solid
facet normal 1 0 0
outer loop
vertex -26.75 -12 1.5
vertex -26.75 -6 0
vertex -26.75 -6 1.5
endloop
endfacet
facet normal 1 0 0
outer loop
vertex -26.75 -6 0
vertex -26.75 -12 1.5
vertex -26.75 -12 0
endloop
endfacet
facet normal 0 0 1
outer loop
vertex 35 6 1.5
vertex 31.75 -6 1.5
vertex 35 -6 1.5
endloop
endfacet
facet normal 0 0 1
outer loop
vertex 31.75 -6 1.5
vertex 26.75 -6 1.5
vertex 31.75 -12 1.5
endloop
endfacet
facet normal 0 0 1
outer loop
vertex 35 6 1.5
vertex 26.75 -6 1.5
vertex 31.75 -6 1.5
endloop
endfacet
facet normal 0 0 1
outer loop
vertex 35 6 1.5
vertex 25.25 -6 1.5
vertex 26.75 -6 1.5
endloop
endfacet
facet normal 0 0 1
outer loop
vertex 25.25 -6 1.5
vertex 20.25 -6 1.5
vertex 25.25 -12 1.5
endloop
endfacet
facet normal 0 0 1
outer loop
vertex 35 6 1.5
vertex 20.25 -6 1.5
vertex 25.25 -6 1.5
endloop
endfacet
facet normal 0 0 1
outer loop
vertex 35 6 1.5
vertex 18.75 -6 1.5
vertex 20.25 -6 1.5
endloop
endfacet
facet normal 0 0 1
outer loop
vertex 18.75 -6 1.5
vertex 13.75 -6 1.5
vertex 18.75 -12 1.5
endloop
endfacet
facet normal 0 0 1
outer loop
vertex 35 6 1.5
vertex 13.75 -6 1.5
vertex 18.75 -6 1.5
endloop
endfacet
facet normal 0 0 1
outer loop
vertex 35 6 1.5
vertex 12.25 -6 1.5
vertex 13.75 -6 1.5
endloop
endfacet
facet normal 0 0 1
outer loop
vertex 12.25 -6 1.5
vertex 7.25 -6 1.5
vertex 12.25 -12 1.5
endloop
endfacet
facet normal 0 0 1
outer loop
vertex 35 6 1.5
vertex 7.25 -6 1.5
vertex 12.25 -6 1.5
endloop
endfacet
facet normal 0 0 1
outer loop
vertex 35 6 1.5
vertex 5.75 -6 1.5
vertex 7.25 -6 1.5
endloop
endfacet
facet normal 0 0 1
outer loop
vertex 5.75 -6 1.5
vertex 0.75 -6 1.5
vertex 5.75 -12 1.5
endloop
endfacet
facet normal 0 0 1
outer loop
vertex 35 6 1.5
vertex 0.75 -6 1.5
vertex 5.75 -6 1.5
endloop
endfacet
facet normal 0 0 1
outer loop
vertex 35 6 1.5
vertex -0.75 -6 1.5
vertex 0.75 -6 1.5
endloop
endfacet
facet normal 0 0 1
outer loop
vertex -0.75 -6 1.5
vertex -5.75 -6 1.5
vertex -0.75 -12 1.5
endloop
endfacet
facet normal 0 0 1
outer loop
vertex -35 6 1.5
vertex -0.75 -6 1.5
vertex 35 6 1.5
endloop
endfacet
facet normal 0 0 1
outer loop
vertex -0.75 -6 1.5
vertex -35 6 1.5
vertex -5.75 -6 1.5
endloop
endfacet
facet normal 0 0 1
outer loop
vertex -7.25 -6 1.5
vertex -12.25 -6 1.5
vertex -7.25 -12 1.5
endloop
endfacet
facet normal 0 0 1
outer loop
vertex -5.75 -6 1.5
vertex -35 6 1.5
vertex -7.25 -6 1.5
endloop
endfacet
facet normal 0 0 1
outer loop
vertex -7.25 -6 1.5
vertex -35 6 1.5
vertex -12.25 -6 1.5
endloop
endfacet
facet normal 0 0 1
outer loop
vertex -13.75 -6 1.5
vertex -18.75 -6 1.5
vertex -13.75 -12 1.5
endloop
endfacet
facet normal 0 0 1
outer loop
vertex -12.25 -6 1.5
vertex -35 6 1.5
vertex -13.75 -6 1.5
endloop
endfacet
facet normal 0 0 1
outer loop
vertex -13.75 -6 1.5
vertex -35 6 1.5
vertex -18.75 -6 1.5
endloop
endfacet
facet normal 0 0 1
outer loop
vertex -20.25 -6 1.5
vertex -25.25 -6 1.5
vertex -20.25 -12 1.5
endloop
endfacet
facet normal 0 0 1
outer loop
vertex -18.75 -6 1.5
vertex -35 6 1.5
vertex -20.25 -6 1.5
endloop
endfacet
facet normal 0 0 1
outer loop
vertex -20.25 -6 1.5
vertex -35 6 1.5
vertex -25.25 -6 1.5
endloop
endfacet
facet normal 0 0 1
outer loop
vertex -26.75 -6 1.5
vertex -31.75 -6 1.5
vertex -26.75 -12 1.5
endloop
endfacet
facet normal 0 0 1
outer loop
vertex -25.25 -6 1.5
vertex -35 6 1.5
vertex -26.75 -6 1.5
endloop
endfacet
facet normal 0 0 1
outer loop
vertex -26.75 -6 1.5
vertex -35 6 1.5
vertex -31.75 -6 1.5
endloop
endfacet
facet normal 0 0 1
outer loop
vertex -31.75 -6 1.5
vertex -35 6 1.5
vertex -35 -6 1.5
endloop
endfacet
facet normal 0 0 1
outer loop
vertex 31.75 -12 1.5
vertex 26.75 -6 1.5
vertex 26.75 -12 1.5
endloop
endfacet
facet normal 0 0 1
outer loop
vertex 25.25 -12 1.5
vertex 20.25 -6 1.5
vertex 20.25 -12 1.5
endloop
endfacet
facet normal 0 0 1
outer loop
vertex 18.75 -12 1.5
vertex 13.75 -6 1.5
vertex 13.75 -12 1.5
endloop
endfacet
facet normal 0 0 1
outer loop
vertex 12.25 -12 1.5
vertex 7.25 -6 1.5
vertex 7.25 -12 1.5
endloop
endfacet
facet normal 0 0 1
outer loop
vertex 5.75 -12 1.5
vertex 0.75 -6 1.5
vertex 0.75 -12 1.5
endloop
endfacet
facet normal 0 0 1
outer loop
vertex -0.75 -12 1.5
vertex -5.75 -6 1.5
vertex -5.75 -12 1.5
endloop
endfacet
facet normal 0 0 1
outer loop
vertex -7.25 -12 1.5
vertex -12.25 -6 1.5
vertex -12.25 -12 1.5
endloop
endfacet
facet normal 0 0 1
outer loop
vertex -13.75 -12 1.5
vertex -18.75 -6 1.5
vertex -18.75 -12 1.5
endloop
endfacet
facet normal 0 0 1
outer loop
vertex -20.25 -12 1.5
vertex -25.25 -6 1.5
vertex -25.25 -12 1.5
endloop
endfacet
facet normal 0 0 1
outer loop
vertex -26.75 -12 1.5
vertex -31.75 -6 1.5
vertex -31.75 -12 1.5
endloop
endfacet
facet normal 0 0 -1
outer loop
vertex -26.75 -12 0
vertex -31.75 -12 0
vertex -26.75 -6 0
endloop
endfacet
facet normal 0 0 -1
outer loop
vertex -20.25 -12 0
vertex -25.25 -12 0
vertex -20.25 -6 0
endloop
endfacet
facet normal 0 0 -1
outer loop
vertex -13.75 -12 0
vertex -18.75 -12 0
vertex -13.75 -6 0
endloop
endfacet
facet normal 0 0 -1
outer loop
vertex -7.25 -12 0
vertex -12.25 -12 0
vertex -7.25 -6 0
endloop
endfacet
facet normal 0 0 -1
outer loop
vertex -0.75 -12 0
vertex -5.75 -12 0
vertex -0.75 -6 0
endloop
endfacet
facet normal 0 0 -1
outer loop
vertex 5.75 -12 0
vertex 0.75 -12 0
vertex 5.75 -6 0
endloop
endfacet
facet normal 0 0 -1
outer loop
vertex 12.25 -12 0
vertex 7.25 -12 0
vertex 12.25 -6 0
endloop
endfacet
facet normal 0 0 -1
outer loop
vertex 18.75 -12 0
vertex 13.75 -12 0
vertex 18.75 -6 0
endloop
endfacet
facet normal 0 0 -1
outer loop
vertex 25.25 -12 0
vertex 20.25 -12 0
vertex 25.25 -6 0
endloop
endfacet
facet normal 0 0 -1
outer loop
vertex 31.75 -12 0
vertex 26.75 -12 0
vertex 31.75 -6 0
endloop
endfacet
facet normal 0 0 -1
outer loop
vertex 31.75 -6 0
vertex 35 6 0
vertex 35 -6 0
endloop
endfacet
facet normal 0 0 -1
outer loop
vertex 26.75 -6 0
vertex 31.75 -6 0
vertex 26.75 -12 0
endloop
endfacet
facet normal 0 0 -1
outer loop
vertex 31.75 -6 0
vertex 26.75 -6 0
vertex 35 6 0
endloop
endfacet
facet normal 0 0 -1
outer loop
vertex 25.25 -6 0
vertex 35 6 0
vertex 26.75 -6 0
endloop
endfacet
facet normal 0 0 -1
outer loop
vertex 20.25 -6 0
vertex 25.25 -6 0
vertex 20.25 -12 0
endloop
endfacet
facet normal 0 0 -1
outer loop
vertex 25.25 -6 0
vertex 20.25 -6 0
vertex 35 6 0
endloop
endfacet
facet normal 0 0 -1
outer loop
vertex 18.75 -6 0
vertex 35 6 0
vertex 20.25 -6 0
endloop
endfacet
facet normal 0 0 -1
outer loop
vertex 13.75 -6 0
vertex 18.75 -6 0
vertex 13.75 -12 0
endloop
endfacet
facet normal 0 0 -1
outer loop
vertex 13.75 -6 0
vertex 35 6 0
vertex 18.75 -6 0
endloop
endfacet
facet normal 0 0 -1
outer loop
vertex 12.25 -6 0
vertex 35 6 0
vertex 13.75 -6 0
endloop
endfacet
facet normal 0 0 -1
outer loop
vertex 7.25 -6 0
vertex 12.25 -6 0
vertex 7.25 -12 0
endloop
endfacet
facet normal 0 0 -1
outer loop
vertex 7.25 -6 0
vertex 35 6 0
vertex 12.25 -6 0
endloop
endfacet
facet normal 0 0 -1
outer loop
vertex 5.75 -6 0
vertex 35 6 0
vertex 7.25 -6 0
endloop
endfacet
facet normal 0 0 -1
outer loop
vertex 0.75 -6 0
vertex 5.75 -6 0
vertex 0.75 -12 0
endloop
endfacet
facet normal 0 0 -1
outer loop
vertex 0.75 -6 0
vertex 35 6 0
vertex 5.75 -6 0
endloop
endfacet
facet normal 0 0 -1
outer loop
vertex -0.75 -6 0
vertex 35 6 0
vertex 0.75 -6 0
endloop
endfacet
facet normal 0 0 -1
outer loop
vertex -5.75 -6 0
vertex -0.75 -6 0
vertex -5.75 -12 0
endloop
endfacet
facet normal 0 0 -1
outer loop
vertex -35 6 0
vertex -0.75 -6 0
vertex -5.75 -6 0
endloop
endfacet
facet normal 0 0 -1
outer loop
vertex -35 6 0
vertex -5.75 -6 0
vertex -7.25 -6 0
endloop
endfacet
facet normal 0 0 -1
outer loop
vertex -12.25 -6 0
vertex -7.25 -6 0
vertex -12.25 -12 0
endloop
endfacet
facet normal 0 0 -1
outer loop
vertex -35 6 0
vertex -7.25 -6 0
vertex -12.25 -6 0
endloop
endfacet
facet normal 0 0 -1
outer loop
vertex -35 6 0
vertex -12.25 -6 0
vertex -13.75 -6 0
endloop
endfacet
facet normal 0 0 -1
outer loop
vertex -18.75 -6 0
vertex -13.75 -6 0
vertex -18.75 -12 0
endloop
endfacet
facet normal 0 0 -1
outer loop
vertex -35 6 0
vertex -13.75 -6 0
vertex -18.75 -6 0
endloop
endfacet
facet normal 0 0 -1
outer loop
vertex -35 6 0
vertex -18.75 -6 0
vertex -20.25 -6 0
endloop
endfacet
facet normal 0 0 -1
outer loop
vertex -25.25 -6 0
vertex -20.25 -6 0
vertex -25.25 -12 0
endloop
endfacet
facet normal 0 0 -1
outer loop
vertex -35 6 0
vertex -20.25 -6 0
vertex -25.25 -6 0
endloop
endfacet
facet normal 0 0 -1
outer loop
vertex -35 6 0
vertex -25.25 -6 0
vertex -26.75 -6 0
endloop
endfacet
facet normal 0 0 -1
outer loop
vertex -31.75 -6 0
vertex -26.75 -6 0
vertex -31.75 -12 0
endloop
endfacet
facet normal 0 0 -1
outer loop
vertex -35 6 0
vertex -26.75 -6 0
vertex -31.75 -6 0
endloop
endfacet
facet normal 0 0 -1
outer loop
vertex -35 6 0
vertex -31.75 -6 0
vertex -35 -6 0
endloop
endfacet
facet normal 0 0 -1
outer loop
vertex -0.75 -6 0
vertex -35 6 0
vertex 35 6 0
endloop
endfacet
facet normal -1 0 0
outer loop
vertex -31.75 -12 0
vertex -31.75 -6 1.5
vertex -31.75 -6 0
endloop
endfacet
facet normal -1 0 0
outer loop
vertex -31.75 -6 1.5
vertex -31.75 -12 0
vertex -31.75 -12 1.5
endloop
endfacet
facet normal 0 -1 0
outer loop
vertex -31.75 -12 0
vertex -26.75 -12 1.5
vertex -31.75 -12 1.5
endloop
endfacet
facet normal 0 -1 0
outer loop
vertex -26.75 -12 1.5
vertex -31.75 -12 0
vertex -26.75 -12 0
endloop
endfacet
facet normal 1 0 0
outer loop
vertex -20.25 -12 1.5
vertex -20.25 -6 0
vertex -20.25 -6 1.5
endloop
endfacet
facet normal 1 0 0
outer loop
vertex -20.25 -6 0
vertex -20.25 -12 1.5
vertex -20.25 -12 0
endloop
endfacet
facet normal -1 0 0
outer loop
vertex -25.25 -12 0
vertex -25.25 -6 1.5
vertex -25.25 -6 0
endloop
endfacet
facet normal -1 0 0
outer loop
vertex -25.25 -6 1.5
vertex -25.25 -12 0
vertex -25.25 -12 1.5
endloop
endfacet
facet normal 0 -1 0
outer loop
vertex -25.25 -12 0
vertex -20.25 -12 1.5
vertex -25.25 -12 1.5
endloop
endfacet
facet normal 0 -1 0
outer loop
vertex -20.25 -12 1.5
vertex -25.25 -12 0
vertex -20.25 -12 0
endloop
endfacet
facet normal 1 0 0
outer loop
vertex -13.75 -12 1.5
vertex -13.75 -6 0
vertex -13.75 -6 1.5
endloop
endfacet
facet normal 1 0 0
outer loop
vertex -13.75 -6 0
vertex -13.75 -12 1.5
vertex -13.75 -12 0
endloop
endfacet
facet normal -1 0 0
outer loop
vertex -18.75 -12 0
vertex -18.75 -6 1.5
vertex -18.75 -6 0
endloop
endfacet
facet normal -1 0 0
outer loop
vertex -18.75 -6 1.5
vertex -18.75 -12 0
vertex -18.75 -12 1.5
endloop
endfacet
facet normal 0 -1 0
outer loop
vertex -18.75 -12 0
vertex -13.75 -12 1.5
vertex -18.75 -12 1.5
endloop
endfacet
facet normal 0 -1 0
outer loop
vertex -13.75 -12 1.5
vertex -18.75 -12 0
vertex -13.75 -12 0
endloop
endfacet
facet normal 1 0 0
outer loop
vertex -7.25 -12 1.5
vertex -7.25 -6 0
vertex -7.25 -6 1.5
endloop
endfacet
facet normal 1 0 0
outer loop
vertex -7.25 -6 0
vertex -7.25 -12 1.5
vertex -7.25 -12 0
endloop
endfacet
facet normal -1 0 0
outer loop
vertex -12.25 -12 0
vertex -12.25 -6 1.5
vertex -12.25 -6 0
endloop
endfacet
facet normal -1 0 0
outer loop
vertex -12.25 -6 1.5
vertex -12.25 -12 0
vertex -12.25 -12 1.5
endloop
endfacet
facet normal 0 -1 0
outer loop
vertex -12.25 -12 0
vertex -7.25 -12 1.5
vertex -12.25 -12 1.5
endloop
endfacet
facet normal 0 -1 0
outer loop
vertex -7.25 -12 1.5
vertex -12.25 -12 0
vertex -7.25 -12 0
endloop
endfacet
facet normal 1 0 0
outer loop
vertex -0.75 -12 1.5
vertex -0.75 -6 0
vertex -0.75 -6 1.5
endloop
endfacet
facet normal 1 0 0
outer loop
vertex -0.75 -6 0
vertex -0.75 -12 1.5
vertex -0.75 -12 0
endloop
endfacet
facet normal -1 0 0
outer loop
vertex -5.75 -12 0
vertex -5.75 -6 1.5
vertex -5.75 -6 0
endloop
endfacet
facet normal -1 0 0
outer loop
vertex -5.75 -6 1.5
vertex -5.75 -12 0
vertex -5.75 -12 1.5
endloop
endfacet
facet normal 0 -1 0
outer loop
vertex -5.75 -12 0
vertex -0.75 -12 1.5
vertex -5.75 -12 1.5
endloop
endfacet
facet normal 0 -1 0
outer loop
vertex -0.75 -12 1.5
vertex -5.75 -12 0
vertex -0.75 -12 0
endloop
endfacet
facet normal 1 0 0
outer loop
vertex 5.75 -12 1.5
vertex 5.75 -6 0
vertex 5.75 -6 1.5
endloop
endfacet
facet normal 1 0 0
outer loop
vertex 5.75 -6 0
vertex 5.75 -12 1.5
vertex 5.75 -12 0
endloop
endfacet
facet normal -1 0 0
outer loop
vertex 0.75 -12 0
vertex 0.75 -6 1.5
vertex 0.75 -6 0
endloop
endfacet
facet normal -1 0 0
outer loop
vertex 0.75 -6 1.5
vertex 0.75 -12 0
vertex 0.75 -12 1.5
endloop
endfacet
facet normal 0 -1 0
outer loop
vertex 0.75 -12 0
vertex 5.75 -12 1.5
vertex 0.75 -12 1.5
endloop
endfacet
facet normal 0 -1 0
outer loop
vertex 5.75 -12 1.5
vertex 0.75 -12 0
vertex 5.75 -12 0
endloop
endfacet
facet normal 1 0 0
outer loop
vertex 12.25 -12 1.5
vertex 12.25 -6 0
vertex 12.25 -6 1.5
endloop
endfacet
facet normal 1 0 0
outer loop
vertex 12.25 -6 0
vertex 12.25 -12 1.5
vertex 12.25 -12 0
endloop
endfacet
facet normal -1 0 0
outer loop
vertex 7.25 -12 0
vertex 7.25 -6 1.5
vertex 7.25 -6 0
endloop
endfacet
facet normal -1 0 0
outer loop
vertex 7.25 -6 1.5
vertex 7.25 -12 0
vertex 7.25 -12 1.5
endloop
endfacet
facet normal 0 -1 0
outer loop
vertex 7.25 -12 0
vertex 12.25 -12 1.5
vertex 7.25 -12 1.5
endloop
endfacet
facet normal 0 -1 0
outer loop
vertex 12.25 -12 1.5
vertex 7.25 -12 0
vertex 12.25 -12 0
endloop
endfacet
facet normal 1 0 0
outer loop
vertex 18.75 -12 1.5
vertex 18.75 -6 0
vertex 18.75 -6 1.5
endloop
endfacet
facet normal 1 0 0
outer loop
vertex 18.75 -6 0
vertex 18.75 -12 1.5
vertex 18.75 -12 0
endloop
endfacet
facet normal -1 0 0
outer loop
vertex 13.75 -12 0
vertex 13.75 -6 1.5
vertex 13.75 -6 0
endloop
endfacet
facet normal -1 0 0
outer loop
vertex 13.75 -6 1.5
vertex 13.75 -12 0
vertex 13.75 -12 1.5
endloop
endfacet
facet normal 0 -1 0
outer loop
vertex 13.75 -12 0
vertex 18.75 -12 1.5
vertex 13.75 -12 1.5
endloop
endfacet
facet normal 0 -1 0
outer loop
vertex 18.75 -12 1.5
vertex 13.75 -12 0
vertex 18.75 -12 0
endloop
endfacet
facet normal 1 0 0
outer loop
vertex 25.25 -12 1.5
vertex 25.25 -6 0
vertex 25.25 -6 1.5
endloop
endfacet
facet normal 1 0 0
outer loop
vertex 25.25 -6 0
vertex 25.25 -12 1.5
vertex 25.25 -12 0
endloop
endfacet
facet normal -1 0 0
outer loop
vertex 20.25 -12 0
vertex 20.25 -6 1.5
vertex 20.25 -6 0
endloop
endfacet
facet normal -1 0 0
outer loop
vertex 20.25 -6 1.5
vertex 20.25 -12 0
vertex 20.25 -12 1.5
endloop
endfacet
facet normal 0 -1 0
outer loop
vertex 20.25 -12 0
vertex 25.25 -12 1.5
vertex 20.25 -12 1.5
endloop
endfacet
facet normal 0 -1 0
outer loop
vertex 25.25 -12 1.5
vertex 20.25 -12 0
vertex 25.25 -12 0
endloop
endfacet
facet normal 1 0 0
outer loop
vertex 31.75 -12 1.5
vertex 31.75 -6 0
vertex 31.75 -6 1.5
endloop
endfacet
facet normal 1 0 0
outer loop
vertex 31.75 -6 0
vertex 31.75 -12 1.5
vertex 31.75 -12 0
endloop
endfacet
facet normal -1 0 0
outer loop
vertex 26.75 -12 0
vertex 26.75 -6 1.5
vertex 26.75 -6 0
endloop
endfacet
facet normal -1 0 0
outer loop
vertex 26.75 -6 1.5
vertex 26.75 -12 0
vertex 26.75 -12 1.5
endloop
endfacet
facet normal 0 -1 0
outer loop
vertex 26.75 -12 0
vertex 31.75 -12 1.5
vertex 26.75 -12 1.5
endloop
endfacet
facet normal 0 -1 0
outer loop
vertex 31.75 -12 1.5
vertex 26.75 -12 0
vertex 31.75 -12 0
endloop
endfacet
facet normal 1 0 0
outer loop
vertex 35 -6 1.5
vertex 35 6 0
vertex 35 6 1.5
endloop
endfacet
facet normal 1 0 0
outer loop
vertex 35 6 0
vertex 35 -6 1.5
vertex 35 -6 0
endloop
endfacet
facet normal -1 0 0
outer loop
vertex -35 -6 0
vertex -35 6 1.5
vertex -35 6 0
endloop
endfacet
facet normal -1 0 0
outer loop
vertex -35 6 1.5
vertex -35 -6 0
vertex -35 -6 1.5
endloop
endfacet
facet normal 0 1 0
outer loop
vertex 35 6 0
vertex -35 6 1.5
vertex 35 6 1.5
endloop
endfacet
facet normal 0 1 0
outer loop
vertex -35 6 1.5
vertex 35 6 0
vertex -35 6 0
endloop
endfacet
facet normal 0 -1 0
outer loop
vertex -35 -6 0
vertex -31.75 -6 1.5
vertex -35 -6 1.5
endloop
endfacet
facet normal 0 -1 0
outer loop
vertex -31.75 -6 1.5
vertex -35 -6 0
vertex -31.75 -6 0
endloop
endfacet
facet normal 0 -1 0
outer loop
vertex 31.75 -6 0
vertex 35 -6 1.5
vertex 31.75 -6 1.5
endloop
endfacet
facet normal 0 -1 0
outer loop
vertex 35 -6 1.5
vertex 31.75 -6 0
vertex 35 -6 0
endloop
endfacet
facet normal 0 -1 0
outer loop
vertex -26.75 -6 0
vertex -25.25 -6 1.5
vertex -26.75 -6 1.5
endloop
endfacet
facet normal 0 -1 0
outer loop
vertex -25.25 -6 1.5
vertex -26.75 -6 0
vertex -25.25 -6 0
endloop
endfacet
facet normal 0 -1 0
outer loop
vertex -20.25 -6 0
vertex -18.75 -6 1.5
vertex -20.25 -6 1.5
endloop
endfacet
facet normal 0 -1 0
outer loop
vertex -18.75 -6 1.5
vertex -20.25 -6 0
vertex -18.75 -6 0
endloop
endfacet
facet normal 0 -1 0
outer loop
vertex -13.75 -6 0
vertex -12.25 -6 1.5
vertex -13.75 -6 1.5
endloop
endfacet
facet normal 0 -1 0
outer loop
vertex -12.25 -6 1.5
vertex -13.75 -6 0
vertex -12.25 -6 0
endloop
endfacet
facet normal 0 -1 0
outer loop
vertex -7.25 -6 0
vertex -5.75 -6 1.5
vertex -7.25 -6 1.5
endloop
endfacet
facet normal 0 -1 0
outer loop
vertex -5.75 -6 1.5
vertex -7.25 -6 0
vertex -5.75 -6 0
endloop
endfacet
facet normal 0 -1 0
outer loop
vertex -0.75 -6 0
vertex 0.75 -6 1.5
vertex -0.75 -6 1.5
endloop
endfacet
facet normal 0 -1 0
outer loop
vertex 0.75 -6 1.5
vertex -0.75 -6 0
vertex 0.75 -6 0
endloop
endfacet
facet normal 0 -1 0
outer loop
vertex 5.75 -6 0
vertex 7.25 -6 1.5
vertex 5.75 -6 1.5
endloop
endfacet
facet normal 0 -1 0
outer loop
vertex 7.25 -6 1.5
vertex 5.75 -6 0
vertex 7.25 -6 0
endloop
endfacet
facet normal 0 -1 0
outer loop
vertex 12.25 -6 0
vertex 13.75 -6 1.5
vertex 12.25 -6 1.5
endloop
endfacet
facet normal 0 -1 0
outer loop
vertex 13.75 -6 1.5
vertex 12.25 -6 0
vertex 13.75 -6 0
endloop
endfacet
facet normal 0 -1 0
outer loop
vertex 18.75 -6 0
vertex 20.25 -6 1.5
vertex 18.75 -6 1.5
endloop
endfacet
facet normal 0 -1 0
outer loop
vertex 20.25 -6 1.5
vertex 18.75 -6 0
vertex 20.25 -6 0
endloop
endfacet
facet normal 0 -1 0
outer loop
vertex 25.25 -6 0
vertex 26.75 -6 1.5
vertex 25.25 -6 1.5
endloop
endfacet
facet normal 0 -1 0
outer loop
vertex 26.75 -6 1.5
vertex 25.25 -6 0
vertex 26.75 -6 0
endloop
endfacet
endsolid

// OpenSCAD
// 10-well comb for casting agarose gels
// Print orientation: flat on bed, teeth pointing down (-Y)

plate_t      = 1.5;   // plate thickness (Z)
spine_l      = 70;    // spine length (X)
spine_w      = 12;    // spine width (Y)
tooth_w      = 5.0;   // tooth width (X)
tooth_l      = 12;    // tooth length (Y)
tooth_count  = 10;    // number of teeth
tooth_gap    = 1.5;   // gap between teeth (X)

$fn = 64;

pitch = tooth_w + tooth_gap;

union() {
    // Spine
    translate([-spine_l/2, -spine_w/2, 0])
        cube([spine_l, spine_w, plate_t]);

    // Teeth
    for (i = [0 : tooth_count - 1])
        translate([(i - (tooth_count - 1)/2) * pitch - tooth_w/2, -tooth_l, 0])
            cube([tooth_w, tooth_l, plate_t]);
}
